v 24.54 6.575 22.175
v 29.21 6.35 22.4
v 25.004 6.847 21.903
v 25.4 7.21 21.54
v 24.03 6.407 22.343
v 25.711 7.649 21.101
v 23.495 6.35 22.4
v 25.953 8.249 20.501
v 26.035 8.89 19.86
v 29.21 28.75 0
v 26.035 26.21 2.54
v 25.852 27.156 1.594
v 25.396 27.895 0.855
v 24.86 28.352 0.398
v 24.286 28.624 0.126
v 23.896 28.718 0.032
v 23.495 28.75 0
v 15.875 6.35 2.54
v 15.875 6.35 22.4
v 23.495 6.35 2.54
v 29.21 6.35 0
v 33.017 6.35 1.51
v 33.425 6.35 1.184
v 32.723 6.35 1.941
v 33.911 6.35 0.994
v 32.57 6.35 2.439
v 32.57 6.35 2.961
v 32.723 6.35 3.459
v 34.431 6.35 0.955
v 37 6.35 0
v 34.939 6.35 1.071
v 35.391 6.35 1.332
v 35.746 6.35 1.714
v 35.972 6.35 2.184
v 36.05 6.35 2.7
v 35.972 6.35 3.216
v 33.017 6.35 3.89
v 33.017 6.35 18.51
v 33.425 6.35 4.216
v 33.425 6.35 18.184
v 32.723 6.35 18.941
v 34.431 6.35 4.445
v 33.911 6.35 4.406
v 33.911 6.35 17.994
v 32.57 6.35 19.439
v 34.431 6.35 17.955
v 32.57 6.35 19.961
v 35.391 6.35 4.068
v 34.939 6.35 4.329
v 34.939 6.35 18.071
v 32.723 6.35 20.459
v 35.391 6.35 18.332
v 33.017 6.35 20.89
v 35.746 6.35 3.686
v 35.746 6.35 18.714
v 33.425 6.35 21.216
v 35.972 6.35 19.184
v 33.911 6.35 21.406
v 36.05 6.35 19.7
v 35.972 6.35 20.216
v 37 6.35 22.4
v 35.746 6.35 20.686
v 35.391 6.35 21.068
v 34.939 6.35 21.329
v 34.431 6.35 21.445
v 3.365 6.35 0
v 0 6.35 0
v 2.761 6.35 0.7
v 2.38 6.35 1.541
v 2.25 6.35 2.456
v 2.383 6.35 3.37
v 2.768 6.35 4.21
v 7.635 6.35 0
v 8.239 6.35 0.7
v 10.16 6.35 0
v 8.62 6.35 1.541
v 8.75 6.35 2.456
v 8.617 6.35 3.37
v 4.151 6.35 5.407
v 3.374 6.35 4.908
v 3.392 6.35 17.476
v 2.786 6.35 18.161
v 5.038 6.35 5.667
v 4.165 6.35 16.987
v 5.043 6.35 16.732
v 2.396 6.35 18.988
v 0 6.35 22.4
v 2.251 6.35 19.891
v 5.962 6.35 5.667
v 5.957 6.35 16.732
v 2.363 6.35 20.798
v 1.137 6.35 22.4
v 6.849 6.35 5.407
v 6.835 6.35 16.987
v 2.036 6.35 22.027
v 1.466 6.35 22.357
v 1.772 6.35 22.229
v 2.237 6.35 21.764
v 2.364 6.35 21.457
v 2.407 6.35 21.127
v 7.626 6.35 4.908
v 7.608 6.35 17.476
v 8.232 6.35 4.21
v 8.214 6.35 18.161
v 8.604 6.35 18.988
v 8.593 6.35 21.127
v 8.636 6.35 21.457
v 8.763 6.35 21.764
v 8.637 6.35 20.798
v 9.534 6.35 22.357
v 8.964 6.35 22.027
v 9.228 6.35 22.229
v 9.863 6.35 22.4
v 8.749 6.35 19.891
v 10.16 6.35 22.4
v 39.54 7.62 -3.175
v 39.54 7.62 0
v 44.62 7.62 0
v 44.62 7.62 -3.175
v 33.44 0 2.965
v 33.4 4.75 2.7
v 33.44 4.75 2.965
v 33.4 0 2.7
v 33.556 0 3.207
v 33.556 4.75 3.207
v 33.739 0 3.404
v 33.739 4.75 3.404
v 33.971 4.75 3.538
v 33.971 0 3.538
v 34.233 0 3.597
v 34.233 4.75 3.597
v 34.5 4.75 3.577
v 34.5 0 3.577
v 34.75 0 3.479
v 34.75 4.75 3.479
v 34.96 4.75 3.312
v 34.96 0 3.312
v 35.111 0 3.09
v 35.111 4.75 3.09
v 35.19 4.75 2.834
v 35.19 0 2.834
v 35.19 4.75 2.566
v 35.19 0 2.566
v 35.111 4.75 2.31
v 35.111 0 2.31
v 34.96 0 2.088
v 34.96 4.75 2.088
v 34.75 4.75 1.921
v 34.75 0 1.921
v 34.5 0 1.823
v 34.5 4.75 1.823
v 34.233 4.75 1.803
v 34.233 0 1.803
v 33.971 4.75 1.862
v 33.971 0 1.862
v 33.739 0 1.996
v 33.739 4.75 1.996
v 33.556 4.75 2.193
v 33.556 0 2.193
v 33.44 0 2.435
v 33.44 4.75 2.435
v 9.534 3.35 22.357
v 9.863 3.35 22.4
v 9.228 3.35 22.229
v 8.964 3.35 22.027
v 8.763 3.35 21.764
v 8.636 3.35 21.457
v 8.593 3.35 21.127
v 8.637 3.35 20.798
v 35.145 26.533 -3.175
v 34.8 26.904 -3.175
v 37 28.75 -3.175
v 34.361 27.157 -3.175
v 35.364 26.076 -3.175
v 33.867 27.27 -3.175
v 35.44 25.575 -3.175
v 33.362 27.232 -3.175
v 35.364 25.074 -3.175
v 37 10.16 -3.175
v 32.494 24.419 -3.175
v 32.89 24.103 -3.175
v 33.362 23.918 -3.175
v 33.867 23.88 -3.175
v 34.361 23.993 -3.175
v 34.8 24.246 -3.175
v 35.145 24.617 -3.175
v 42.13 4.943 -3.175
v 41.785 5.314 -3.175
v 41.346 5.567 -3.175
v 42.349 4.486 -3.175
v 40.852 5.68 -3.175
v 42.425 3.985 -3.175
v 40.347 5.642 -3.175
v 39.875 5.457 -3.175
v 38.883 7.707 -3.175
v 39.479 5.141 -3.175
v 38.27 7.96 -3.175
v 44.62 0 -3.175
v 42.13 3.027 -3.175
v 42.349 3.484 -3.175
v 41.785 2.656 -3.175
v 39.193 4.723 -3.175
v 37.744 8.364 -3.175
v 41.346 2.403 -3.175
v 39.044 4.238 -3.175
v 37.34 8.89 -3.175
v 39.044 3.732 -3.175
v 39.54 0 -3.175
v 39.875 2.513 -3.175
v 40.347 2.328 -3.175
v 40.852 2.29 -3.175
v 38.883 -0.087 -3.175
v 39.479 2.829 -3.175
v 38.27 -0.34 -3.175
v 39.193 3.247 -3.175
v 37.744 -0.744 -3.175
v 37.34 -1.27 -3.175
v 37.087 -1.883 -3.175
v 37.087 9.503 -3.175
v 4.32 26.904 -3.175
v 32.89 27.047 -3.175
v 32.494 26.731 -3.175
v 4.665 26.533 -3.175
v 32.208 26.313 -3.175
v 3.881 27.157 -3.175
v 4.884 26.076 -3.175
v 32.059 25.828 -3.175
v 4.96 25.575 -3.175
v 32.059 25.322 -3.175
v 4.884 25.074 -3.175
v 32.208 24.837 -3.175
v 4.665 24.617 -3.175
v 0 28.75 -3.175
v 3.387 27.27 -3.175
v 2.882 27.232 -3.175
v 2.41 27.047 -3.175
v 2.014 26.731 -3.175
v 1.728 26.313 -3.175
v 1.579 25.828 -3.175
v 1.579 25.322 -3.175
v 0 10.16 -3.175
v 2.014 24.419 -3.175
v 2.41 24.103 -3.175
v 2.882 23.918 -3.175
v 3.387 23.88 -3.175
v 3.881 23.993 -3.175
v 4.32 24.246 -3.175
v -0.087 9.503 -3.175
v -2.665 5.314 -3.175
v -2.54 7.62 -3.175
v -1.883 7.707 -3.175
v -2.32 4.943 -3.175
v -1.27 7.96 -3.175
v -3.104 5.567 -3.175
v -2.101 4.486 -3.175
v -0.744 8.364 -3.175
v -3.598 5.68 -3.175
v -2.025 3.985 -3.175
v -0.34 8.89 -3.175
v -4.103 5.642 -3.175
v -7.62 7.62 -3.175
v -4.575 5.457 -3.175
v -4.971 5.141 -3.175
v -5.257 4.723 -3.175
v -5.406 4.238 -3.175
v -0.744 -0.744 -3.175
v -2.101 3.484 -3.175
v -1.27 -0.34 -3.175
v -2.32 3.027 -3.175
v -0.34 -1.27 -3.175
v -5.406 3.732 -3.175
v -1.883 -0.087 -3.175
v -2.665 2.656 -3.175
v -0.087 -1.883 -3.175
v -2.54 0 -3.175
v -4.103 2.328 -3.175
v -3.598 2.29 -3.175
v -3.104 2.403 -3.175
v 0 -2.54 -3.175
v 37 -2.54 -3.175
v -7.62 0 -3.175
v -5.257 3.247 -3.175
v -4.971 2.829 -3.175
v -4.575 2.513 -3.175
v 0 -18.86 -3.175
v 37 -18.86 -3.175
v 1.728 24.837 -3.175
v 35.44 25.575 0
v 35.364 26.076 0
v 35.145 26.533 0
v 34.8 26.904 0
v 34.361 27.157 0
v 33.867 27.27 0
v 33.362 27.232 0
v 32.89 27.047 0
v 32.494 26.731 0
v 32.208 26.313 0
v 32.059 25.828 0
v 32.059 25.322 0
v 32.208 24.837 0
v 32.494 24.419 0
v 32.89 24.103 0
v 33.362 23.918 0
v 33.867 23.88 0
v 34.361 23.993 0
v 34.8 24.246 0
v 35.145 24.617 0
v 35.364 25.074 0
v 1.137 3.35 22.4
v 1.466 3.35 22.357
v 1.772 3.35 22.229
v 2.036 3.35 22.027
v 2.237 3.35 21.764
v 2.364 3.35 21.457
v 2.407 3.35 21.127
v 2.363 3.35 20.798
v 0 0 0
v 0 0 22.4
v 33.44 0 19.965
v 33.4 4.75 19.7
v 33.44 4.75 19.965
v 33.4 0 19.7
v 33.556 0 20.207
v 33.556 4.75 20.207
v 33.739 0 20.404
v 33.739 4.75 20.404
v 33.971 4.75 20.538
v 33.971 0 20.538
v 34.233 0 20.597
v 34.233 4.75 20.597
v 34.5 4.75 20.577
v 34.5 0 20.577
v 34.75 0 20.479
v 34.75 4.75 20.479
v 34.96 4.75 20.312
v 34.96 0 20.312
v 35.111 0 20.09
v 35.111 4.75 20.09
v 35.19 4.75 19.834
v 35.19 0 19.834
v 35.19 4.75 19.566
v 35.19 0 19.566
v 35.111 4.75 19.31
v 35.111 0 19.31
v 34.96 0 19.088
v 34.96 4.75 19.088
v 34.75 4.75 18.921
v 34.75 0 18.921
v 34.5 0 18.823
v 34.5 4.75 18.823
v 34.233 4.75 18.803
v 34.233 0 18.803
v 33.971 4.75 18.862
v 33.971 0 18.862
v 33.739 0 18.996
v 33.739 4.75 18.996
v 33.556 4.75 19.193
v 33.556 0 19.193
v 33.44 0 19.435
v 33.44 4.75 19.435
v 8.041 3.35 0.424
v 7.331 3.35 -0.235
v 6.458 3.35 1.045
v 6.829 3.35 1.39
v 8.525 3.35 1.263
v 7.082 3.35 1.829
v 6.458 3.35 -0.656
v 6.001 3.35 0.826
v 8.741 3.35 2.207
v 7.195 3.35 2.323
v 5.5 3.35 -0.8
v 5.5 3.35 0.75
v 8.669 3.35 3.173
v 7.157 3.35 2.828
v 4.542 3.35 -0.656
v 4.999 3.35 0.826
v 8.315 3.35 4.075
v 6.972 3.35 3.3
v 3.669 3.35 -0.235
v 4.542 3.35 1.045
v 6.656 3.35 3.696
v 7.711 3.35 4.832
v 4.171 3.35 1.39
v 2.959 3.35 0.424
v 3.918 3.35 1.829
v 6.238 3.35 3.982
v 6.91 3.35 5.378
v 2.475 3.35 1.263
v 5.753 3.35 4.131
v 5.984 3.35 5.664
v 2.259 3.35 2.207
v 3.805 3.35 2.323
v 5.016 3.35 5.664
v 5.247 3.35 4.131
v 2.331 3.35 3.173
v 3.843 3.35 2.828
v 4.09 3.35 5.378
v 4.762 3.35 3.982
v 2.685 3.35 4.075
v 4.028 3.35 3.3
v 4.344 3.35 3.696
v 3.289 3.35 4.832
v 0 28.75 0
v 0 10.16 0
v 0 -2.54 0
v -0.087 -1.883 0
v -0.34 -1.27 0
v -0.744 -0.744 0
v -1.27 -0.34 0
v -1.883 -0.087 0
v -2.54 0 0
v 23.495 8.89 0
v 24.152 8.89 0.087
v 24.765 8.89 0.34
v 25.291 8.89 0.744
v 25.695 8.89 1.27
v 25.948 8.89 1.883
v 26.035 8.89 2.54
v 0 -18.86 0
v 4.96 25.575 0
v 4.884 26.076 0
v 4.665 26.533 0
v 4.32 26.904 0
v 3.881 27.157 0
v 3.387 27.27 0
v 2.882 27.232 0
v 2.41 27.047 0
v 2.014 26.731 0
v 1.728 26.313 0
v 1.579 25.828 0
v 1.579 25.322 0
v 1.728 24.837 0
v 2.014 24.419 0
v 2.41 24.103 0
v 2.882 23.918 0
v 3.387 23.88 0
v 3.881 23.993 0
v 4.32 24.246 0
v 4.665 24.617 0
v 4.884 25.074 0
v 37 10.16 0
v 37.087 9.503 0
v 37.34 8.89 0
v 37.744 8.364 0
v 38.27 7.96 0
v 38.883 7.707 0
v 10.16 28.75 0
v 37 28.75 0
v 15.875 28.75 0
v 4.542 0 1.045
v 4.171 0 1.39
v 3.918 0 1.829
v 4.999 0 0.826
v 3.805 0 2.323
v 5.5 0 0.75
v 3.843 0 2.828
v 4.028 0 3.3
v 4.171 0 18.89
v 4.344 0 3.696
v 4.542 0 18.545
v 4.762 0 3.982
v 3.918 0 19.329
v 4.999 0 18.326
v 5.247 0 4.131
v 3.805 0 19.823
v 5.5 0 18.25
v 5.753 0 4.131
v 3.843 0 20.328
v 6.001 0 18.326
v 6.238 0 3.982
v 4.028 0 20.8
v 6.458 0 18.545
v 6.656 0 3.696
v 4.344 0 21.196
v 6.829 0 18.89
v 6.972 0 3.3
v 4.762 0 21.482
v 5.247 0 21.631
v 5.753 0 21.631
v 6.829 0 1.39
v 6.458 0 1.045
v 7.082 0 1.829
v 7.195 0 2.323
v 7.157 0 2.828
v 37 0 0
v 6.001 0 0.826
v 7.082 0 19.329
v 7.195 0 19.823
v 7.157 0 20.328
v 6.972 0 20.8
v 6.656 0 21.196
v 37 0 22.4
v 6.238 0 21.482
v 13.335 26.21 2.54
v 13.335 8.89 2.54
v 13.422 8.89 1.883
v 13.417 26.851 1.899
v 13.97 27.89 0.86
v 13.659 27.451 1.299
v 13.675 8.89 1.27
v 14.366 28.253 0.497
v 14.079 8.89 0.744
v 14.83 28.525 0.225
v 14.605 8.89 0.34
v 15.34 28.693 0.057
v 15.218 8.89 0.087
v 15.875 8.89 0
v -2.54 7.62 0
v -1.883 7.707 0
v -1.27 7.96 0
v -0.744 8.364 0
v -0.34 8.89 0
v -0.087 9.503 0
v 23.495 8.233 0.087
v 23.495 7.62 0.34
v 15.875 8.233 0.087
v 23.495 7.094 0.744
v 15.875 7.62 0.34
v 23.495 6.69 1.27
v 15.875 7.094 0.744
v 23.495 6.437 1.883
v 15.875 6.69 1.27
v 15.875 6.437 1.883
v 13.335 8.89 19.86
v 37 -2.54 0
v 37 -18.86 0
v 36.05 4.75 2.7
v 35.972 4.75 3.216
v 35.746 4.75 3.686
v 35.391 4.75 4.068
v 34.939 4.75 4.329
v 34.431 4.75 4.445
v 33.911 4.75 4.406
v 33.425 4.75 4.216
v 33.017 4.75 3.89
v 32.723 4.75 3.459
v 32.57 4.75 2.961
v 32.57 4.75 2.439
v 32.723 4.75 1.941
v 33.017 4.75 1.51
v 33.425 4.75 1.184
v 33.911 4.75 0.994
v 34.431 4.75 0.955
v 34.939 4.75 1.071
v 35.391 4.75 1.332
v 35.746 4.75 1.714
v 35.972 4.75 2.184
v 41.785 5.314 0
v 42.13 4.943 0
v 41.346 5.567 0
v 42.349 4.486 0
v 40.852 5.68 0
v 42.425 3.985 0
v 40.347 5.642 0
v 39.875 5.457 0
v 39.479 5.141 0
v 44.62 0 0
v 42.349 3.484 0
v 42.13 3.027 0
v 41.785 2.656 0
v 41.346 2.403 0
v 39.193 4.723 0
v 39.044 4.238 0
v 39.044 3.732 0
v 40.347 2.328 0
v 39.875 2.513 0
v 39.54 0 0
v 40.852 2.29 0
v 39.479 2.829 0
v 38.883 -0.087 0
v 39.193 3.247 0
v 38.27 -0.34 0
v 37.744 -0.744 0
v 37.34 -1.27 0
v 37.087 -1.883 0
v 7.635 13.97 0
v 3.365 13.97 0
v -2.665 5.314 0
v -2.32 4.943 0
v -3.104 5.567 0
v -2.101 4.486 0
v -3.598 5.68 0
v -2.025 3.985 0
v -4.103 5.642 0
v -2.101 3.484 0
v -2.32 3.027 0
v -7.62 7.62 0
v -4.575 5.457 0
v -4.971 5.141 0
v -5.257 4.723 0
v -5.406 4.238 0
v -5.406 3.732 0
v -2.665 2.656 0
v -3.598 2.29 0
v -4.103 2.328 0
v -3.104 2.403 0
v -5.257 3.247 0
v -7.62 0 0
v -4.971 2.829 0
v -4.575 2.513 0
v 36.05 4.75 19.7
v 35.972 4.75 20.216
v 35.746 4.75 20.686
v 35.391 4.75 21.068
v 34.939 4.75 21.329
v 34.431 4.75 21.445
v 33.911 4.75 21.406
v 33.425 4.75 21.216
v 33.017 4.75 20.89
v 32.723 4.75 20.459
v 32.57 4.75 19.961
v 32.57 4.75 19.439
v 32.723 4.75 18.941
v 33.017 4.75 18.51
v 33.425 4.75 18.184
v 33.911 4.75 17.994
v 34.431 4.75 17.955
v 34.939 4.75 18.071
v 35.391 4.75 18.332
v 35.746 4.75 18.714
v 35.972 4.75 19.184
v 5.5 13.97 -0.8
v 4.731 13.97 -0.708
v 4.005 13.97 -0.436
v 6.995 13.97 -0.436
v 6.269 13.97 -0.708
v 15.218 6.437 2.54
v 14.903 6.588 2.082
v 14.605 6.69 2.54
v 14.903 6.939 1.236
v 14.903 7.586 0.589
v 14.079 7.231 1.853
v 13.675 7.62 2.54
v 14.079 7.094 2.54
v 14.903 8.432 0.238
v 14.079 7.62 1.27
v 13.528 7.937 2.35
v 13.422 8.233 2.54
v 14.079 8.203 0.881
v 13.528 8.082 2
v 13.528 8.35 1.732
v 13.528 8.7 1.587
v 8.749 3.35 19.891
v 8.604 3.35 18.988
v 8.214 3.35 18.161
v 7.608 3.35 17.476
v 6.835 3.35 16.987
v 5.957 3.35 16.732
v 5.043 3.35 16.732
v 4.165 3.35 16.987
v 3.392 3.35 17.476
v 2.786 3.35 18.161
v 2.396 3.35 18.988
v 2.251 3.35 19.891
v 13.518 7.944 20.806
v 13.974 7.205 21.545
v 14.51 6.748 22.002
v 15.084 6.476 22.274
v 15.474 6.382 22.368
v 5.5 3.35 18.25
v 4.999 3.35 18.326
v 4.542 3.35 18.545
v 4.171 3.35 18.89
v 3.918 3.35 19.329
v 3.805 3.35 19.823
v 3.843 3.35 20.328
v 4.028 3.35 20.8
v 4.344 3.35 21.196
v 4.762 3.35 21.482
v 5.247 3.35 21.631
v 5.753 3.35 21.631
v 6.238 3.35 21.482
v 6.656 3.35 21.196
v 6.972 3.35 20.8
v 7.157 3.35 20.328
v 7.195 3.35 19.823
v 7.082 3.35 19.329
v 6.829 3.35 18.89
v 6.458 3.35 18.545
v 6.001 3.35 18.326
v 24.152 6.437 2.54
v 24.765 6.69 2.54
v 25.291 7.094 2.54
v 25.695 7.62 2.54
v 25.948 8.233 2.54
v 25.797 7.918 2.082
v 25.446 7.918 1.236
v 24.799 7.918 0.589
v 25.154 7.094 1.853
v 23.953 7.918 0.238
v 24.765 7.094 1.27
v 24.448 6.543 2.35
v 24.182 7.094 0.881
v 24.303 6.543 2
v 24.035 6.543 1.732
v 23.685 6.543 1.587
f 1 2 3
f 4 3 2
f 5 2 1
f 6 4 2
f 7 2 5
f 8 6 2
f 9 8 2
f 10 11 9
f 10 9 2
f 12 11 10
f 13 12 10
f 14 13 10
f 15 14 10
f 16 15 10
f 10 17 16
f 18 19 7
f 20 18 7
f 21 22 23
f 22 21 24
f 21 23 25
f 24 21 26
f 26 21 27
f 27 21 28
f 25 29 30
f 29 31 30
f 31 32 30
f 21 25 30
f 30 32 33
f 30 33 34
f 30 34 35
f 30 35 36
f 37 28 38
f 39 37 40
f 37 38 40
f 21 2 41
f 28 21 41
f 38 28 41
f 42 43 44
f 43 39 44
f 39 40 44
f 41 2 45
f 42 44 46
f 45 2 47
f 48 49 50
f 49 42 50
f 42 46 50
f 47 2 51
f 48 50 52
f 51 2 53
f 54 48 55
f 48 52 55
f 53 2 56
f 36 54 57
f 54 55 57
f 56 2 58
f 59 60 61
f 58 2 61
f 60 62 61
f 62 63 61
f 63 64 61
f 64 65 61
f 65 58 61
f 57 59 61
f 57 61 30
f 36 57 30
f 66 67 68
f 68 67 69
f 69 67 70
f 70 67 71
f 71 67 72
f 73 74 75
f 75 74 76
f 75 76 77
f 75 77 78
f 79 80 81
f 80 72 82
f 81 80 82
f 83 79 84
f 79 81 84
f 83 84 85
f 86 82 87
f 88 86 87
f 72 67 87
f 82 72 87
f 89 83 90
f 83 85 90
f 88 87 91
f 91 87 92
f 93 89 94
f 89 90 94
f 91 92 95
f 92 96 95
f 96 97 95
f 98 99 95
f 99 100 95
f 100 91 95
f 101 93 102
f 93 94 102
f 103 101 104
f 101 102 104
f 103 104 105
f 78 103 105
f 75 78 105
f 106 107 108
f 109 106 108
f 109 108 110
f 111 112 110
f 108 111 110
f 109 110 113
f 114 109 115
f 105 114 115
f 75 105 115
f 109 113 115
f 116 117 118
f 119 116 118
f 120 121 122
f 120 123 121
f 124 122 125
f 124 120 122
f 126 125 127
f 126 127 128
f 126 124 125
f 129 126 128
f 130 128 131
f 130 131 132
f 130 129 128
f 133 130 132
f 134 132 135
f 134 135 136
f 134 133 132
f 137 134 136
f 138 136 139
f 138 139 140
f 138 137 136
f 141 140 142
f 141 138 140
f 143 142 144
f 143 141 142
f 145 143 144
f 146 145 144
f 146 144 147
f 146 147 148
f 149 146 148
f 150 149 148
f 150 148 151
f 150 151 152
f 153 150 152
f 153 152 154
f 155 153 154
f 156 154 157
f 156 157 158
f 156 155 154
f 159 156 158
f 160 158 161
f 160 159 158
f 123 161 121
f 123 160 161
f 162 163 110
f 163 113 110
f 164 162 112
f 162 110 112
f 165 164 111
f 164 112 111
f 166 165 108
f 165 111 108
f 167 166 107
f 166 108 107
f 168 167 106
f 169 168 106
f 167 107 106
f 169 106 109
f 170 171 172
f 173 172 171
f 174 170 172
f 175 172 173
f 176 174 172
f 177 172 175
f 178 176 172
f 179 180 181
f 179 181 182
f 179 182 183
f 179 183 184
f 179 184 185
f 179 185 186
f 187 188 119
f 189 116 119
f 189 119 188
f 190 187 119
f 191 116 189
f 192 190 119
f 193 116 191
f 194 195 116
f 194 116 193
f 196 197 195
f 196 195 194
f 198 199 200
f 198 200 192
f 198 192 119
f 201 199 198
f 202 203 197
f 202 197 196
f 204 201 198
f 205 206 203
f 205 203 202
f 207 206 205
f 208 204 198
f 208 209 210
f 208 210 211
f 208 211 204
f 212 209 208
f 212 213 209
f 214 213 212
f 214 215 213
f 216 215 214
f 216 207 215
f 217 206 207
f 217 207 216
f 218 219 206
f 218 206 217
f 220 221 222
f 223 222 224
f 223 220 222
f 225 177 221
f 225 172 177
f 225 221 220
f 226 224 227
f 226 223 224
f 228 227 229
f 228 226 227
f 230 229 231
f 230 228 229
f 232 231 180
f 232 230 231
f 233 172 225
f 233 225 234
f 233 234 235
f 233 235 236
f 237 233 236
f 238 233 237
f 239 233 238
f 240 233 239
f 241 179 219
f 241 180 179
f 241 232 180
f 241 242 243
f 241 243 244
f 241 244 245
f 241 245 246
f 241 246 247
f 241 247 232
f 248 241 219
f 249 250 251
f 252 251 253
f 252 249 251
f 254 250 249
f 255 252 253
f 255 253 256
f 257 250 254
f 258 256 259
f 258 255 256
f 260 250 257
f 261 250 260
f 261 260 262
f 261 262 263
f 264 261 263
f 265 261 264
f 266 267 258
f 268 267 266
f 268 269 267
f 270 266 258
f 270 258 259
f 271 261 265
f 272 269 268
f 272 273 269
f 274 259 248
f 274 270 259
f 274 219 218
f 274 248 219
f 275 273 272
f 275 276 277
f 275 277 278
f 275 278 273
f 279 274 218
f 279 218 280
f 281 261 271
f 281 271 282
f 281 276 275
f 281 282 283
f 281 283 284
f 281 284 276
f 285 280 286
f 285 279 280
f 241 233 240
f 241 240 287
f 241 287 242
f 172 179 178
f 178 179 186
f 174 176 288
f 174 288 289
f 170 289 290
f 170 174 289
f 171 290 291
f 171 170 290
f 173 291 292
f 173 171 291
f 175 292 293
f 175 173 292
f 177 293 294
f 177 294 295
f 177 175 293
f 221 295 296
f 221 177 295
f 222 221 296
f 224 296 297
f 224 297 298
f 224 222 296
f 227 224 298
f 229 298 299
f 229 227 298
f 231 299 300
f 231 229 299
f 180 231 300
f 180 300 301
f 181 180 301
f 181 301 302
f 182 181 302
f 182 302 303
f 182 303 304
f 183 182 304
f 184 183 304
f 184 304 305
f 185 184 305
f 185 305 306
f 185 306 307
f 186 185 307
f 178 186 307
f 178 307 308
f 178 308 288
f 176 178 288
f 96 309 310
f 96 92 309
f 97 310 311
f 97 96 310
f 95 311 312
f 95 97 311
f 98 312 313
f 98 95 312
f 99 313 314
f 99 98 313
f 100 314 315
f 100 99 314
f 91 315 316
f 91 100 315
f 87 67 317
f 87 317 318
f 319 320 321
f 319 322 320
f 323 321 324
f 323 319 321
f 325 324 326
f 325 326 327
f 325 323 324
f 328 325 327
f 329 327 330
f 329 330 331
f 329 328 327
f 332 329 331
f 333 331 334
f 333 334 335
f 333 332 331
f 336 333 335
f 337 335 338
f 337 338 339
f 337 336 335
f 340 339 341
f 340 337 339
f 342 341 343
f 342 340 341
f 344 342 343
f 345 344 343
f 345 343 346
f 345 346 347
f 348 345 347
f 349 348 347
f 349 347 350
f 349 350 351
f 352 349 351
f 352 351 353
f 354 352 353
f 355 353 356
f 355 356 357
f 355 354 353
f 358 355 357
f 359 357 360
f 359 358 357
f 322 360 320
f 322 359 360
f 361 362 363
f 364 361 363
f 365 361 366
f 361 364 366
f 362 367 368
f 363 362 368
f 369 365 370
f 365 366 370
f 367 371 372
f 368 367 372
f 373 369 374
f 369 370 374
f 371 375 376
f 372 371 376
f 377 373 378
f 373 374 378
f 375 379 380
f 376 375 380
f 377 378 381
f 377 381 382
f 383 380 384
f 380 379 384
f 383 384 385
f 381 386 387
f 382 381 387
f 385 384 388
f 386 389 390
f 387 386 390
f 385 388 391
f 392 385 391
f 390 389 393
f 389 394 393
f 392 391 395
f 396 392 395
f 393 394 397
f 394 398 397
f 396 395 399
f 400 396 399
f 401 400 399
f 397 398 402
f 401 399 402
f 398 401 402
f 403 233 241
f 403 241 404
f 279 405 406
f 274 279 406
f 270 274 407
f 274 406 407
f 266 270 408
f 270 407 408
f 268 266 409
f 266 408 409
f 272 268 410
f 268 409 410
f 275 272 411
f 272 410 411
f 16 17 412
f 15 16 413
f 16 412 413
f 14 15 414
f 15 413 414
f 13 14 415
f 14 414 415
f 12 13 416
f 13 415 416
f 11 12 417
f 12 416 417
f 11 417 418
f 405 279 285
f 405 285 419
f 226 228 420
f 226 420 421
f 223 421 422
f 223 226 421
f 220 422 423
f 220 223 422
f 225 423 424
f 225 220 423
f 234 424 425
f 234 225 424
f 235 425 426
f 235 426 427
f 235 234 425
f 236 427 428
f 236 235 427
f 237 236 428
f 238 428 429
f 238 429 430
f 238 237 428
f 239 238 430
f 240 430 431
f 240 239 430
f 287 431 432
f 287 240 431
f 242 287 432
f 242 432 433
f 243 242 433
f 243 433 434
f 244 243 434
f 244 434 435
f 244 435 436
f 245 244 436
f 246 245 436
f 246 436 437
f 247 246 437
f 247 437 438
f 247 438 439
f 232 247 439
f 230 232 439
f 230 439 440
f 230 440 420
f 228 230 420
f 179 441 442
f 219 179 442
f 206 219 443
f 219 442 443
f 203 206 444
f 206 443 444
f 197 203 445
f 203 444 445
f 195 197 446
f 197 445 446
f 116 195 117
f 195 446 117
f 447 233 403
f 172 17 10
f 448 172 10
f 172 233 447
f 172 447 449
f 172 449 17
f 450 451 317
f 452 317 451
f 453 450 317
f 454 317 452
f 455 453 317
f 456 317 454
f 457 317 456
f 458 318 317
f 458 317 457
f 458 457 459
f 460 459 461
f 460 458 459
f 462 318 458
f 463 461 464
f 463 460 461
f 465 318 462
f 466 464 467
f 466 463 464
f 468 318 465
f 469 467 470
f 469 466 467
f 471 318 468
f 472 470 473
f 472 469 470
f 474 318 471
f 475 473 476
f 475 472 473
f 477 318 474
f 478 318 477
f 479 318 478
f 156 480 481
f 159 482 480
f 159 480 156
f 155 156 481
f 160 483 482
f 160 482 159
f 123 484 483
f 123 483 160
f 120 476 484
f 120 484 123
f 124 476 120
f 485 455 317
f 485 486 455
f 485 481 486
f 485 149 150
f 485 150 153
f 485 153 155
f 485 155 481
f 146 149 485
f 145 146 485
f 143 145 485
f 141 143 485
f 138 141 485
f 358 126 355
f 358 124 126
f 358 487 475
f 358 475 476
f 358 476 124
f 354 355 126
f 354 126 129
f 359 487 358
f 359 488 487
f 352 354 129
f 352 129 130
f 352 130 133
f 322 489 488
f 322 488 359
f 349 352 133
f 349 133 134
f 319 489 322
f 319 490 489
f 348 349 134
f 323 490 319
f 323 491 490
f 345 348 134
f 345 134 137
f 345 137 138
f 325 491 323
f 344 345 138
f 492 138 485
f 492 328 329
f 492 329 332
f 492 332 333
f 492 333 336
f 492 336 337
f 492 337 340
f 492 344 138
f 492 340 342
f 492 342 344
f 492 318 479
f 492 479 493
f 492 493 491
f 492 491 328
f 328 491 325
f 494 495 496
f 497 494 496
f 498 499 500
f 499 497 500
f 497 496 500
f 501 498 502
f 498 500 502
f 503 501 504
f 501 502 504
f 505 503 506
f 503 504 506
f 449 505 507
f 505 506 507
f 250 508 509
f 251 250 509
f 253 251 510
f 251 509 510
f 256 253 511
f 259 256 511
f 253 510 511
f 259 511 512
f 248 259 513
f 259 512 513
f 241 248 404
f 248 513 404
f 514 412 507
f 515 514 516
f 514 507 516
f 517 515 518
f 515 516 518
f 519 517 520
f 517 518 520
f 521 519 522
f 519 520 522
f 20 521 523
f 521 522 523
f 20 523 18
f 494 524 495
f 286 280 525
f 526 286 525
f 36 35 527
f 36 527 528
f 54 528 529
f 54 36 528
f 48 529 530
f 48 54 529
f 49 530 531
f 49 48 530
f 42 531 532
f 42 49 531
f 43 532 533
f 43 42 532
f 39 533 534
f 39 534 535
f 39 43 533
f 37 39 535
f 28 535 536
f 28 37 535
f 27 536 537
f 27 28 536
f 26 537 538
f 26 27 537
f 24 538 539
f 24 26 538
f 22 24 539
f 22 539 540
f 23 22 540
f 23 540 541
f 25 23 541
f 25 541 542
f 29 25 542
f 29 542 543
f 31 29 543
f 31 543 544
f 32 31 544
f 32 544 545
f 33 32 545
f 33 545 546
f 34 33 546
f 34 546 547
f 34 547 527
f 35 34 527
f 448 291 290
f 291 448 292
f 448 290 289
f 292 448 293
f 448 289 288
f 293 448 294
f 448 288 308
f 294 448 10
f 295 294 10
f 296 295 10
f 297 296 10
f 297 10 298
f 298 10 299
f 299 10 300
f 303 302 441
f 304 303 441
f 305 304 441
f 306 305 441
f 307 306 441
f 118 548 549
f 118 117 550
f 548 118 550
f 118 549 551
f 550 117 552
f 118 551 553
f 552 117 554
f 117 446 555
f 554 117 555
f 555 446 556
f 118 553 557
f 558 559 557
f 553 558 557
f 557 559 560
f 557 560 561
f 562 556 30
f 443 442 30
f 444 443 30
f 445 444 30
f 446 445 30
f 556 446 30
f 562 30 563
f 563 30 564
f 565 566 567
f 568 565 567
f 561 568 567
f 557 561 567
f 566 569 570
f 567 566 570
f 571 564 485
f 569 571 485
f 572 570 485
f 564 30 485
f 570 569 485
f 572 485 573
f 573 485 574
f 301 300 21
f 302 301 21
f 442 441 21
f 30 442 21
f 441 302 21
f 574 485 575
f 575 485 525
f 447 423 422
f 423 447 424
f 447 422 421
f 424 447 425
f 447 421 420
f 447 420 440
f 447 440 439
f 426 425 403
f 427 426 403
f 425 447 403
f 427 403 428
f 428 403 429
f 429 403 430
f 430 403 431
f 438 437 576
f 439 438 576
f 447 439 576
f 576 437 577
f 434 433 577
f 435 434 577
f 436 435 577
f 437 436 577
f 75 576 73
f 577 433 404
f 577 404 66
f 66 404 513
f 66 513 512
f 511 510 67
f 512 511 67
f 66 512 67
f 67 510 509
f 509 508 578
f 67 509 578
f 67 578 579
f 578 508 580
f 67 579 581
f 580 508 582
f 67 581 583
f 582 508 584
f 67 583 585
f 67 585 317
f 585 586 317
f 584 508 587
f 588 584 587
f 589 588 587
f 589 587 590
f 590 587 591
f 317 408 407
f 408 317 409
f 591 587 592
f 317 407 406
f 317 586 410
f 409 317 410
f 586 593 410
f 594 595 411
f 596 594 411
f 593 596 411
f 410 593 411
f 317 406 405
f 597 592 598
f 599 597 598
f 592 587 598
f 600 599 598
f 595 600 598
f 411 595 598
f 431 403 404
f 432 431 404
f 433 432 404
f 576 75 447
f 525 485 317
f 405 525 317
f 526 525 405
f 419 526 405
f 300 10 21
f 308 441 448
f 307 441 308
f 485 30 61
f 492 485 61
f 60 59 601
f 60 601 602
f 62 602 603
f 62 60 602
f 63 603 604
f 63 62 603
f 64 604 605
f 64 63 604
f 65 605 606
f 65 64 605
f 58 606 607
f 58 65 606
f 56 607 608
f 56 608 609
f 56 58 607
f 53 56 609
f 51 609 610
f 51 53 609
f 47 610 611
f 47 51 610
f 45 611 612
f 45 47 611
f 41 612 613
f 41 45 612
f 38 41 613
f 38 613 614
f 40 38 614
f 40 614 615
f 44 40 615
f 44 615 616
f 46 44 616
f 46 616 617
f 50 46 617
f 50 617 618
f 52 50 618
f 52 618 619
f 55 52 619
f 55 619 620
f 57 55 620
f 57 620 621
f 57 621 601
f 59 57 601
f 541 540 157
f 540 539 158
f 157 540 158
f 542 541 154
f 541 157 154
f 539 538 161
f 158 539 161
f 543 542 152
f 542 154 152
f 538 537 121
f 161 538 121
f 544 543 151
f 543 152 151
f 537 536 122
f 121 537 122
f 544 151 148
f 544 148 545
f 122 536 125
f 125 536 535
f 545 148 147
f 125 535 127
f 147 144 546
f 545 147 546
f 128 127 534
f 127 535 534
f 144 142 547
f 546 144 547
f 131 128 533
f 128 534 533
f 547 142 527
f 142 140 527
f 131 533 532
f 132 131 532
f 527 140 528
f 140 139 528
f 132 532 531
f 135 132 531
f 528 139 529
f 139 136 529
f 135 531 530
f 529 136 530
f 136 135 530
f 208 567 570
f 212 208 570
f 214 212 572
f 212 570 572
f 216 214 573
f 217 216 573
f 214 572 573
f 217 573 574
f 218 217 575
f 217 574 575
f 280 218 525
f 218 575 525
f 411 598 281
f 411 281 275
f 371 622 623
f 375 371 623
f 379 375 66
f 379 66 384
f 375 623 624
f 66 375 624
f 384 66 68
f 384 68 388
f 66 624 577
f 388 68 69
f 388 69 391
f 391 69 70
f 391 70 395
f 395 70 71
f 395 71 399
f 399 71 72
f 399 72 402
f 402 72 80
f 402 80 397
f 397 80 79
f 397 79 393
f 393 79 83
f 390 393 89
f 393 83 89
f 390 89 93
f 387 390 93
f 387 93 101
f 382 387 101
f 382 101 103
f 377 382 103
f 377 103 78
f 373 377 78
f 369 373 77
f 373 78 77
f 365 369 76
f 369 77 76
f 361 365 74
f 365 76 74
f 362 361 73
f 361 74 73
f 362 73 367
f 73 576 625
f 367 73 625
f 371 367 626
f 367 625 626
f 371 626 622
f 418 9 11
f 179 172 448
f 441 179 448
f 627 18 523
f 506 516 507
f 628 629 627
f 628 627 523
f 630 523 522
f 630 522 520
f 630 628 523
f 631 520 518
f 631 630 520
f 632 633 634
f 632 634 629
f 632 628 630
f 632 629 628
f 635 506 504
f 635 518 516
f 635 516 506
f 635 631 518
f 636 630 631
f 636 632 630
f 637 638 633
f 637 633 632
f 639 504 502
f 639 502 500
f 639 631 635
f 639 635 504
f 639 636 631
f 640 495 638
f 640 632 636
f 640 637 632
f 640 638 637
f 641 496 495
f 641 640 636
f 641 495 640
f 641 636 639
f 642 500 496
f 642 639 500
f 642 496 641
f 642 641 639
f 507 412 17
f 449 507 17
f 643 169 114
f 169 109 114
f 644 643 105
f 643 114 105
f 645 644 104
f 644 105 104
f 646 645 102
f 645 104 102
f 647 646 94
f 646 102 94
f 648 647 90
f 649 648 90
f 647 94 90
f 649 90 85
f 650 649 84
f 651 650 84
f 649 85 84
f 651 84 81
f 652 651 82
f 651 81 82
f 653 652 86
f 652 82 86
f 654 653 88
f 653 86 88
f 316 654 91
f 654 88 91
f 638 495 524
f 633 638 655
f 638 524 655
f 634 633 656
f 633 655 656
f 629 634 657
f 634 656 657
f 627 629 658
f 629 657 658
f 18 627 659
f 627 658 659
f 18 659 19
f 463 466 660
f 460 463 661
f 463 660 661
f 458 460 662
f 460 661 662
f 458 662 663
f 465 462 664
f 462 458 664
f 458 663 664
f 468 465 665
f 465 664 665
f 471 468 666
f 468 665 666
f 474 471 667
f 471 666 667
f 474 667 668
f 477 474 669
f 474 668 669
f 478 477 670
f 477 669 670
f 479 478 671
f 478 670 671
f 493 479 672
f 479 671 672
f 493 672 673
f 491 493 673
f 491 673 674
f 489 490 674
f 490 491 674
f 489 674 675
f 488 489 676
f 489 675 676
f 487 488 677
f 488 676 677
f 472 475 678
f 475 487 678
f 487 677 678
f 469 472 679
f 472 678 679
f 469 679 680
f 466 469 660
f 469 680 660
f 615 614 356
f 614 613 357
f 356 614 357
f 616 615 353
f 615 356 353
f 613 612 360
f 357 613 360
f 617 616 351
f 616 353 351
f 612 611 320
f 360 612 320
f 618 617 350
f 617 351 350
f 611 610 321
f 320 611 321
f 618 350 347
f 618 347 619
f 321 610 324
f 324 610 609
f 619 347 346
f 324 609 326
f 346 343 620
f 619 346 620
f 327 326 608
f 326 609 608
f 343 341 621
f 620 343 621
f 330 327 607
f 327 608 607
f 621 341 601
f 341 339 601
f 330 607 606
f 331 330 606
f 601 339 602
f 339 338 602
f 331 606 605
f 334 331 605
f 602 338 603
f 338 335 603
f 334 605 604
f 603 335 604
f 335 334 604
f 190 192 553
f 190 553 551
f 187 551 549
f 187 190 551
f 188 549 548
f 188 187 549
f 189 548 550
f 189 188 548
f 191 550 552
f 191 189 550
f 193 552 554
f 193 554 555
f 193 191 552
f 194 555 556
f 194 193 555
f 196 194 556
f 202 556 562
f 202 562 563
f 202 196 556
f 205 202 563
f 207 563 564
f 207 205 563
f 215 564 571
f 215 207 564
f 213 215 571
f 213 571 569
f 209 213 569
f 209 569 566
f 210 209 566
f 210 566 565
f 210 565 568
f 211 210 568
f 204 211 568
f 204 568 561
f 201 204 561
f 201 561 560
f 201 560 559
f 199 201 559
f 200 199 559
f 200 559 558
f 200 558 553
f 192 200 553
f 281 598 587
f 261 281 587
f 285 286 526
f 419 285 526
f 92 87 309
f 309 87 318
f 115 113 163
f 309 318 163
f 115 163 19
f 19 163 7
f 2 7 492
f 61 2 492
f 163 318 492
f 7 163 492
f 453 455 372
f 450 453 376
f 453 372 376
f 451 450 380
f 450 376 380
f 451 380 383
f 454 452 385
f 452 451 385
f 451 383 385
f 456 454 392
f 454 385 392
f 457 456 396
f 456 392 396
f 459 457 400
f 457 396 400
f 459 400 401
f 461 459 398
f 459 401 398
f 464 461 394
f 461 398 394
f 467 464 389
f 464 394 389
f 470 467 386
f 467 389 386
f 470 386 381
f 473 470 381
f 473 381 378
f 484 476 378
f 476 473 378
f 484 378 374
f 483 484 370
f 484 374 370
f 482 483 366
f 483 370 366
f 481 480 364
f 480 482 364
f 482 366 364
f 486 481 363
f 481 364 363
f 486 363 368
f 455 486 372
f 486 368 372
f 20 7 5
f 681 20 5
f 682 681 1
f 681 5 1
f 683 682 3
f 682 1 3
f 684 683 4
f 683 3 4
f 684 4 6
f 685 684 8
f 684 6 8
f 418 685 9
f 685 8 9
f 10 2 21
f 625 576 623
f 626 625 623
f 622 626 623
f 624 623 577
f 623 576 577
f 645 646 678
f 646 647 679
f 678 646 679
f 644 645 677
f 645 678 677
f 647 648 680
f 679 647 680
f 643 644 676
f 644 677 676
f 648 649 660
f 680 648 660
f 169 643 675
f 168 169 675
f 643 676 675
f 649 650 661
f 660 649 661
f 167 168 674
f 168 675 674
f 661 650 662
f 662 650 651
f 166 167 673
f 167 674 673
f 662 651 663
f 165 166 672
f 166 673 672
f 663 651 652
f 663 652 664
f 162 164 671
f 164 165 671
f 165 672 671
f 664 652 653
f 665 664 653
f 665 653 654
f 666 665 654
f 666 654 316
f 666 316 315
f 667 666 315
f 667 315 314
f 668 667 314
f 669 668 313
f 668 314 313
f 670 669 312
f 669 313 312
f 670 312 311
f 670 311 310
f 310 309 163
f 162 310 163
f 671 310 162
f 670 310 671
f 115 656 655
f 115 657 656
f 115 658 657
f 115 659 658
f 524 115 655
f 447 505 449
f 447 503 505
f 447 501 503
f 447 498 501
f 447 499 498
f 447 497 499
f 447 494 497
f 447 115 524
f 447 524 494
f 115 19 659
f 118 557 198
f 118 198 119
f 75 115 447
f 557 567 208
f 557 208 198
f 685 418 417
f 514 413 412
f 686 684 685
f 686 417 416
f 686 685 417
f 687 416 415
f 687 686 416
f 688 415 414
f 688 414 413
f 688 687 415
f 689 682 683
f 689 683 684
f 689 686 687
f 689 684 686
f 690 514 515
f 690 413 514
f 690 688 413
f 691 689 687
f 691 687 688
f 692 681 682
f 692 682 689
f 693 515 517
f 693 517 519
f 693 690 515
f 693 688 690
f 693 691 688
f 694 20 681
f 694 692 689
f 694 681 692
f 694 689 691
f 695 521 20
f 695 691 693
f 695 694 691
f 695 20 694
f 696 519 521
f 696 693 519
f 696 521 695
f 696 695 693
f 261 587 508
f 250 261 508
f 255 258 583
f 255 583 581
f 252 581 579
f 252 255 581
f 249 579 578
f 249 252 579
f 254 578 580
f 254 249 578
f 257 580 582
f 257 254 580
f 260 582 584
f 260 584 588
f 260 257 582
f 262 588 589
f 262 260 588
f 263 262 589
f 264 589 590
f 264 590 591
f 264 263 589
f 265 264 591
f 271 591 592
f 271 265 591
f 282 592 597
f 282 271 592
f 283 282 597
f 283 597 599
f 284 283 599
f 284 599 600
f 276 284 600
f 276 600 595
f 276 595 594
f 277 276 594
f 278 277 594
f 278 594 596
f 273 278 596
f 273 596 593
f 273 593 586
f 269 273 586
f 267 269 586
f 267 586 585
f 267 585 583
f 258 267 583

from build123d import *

# Parameters (mm, degrees)
SKETCH1_W                        = 37
SKETCH1_H                        = 22.4
BOSS_EXTRUDE1_DEPTH              = 6.35
SKETCH7_W                        = 3.175
SKETCH7_H                        = 47.610000126
BOSS_EXTRUDE2_DEPTH              = 37
CBORE_FOR_M3_SHCS3_AT_2_COUNT    = 2
CBORE_FOR_M3_SHCS3_AT_2_PITCH    = 17.5
CBORE_FOR_M1_6_SHCS1_D           = 1.8
CBORE_FOR_M1_6_SHCS1_CBORE_D     = 3.5
CBORE_FOR_M1_6_SHCS1_CBORE_DEPTH = 1.6
BOSS_EXTRUDE3_START              = -10.16
BOSS_EXTRUDE3_DEPTH              = 3.175
BOSS_EXTRUDE4_START              = -29.21
BOSS_EXTRUDE4_DEPTH              = 3.175
SKETCH18_W                       = 7.62
SKETCH18_H                       = 7.62
BOSS_EXTRUDE5_DEPTH              = 3.175
M3_CLEARANCE_HOLE1_D             = 3.4
FILLET1_R                        = 2.54
FILLET2_R                        = 1.27


with BuildPart() as part:
    # Sketch1 → Boss-Extrude1 (new body)
    with BuildSketch(Plane(origin=(0, 0, 0), x_dir=(1, 0, 0), z_dir=(0, 1, 0))):
        with Locations((18.5, 11.2)):
            Rectangle(SKETCH1_W, SKETCH1_H)
    extrude(amount=BOSS_EXTRUDE1_DEPTH)

    # Sketch7 → Boss-Extrude2 (add)
    with BuildSketch(Plane(origin=(37, 0, 0), x_dir=(0, 0, -1), z_dir=(1, 0, 0))):
        with Locations((-1.5875, 4.944999937)):
            Rectangle(SKETCH7_W, SKETCH7_H)
    extrude(amount=-BOSS_EXTRUDE2_DEPTH)

    # Sketch13 → CBORE for M3 SHCS3 (revolve, cut)
    with BuildSketch(Plane(origin=(5.5, 13.97, -2.45), x_dir=(0, 0, 1), z_dir=(1, 0, 0))):
        Polygon((0, 0), (0, 32.830000126), (1.7, 32.830000126), (1.7, 10.62), (3.25, 10.62), (3.25, 0), align=None)
    cbore_for_m3_shcs3 = revolve(axis=Axis((5.5, 20.32, -2.45), (0, -1, 0)), mode=Mode.SUBTRACT)

    # CBORE for M3 SHCS3 at 2: CBORE for M3 SHCS3 ×2
    with Locations(*[(0, 0, -i * CBORE_FOR_M3_SHCS3_AT_2_PITCH) for i in range(1, CBORE_FOR_M3_SHCS3_AT_2_COUNT)]):
        add(cbore_for_m3_shcs3, mode=Mode.SUBTRACT)

    # CBORE for M1.6 SHCS1 (through all)
    with Locations(Plane(origin=(0, 6.35, 0), x_dir=(1, 0, 0), z_dir=(0, 1, 0))):
        with Locations((34.3, 19.7), (34.3, 2.7)):
            CounterBoreHole(CBORE_FOR_M1_6_SHCS1_D / 2, CBORE_FOR_M1_6_SHCS1_CBORE_D / 2, CBORE_FOR_M1_6_SHCS1_CBORE_DEPTH)

    # Sketch16 → Boss-Extrude3 (add)
    with BuildSketch(Plane.ZY.offset(BOSS_EXTRUDE3_START)):
        Polygon((-22.4, 6.35), (0, 6.35), (0, 28.75), align=None)
    extrude(amount=-BOSS_EXTRUDE3_DEPTH)

    # Sketch16<2> → Boss-Extrude4 (add)
    with BuildSketch(Plane.ZY.offset(BOSS_EXTRUDE4_START)):
        Polygon((-22.4, 6.35), (0, 6.35), (0, 28.75), align=None)
    extrude(amount=BOSS_EXTRUDE4_DEPTH)

    # Sketch18 → Boss-Extrude5 (add, through all)
    with BuildSketch(Plane.XY):
        with Locations((40.81, 3.81)):
            Rectangle(SKETCH18_W, SKETCH18_H)
        with Locations((-3.81, 3.81)):
            Rectangle(SKETCH18_W, SKETCH18_H)
    extrude(amount=BOSS_EXTRUDE5_DEPTH)

    # M3 Clearance Hole1 (through all)
    with Locations(Plane(origin=(0, 0, 0), x_dir=(-1, 0, 0), z_dir=(0, 0, -1))):
        with Locations((-40.725, 3.985), (-33.74, 25.575), (-3.26, 25.575), (3.725, 3.985)):
            Hole(M3_CLEARANCE_HOLE1_D / 2)

    # Fillet1
    # the kernel refuses this fillet: 2.54 mm, written as the material it adds along each edge
    with BuildSketch(Plane(origin=(15.875, 8.89, -2.54), x_dir=(0, -1, 0), z_dir=(-1, 0, 0))) as fillet1_piece_1_section:
        Polygon((0, 0), (FILLET1_R, 0), (FILLET1_R, FILLET1_R), (0, FILLET1_R), align=None)
    fillet1_piece_1 = extrude(amount=FILLET1_R, mode=Mode.PRIVATE)
    fillet1_piece_1 = fillet1_piece_1 - Plane(origin=(15.875, 8.89, -2.54), x_dir=(0, 0.7071067811865475, -0.7071067811865475), z_dir=(-1, 0, 0)) * Sphere(FILLET1_R, mode=Mode.PRIVATE)
    add(fillet1_piece_1)
    with BuildSketch(Plane(origin=(23.495, 8.89, -2.54), x_dir=(1, 0, 0), z_dir=(0, -1, 0))) as fillet1_piece_2_section:
        Polygon((0, 0), (FILLET1_R, 0), (FILLET1_R, FILLET1_R), (0, FILLET1_R), align=None)
    fillet1_piece_2 = extrude(amount=FILLET1_R, mode=Mode.PRIVATE)
    fillet1_piece_2 = fillet1_piece_2 - Plane(origin=(23.495, 8.89, -2.54), x_dir=(-0.7071067811865475, 0, -0.7071067811865475), z_dir=(0, -1, 0)) * Sphere(FILLET1_R, mode=Mode.PRIVATE)
    add(fillet1_piece_2)
    with BuildSketch(Plane(origin=(0, 0, 0), x_dir=(0, -1, 0), z_dir=(0, 0, 1)), Plane(origin=(37, 7.62, 0), x_dir=(0, 1, 0), z_dir=(0, 0, 1))) as fillet1_piece_3:
        with BuildLine():
            CenterArc((FILLET1_R, -FILLET1_R), FILLET1_R, 90, 90)
            Line((0, -FILLET1_R), (0, 0))
            Line((0, 0), (FILLET1_R, 0))
        make_face()
    extrude(amount=3.175)
    with BuildSketch(Plane(origin=(0, 7.62, 0), x_dir=(0, 1, 0), z_dir=(0, 0, 1)), Plane(origin=(37, 0, 0), x_dir=(0, -1, 0), z_dir=(0, 0, 1))) as fillet1_piece_4:
        with BuildLine():
            CenterArc((FILLET1_R, FILLET1_R), FILLET1_R, 180, 90)
            Line((0, FILLET1_R), (0, 0))
            Line((0, 0), (FILLET1_R, 0))
        make_face()
    extrude(amount=3.175)
    with BuildSketch(Plane(origin=(15.875, 6.35, 0), x_dir=(0, 0, -1), z_dir=(1, 0, 0))) as fillet1_piece_5:
        with BuildLine():
            CenterArc((FILLET1_R, FILLET1_R), FILLET1_R, 180, 90)
            Line((0, FILLET1_R), (0, 0))
            Line((0, 0), (FILLET1_R, 0))
        make_face()
    extrude(amount=7.62)
    with BuildSketch(Plane(origin=(13.335, 8.89, 0), x_dir=(1, 0, 0), z_dir=(0, 1, 0))) as fillet1_piece_6_section:
        with BuildLine():
            CenterArc((FILLET1_R, FILLET1_R), FILLET1_R, 180, 90)
            Line((0, FILLET1_R), (0, 0))
            Line((0, 0), (FILLET1_R, 0))
        make_face()
    fillet1_piece_6 = extrude(amount=19.86, mode=Mode.PRIVATE)
    fillet1_piece_6 = split(fillet1_piece_6, bisect_by=Plane(origin=(13.919159385, 23.364808453, -5.385191547), z_dir=(0, -0.7071067811865476, 0.7071067811865476)), keep=Keep.TOP, mode=Mode.PRIVATE)
    add(fillet1_piece_6)
    with BuildSketch(Plane(origin=(13.335, 6.35, -22.4), x_dir=(1, 0, 0), z_dir=(0, 0, 1))) as fillet1_piece_7_section:
        with BuildLine():
            CenterArc((FILLET1_R, FILLET1_R), FILLET1_R, 180, 90)
            Line((0, FILLET1_R), (0, 0))
            Line((0, 0), (FILLET1_R, 0))
        make_face()
    fillet1_piece_7 = extrude(amount=19.86, mode=Mode.PRIVATE)
    fillet1_piece_7 = split(fillet1_piece_7, bisect_by=Plane(origin=(13.919159385, 11.735191547, -17.014808453), z_dir=(0, -0.7071067811865476, 0.7071067811865476)), keep=Keep.TOP, mode=Mode.PRIVATE)
    add(fillet1_piece_7)
    with BuildSketch(Plane(origin=(26.035, 6.35, -22.4), x_dir=(-1, 0, 0), z_dir=(0, 0, 1))) as fillet1_piece_8_section:
        with BuildLine():
            CenterArc((FILLET1_R, -FILLET1_R), FILLET1_R, 90, 90)
            Line((0, -FILLET1_R), (0, 0))
            Line((0, 0), (FILLET1_R, 0))
        make_face()
    fillet1_piece_8 = extrude(amount=19.86, mode=Mode.PRIVATE)
    fillet1_piece_8 = split(fillet1_piece_8, bisect_by=Plane(origin=(25.450840615, 11.735191547, -17.014808453), z_dir=(0, -0.7071067811865476, 0.7071067811865476)), keep=Keep.TOP, mode=Mode.PRIVATE)
    add(fillet1_piece_8)
    with BuildSketch(Plane(origin=(26.035, 8.89, 0), x_dir=(-1, 0, 0), z_dir=(0, 1, 0))) as fillet1_piece_9_section:
        with BuildLine():
            CenterArc((FILLET1_R, -FILLET1_R), FILLET1_R, 90, 90)
            Line((0, -FILLET1_R), (0, 0))
            Line((0, 0), (FILLET1_R, 0))
        make_face()
    fillet1_piece_9 = extrude(amount=19.86, mode=Mode.PRIVATE)
    fillet1_piece_9 = split(fillet1_piece_9, bisect_by=Plane(origin=(25.450840615, 23.364808453, -5.385191547), z_dir=(0, -0.7071067811865476, 0.7071067811865476)), keep=Keep.TOP, mode=Mode.PRIVATE)
    add(fillet1_piece_9)

    # Fillet2
    fillet2_edges = [part.edges().sort_by_distance(p)[0] for p in [
        (7.63541565, 4.85, -22.4),
        (3.36458435, 4.85, -22.4),
    ]]
    fillet(fillet2_edges, radius=FILLET2_R)


with BuildPart() as body_2:
    # Mirror1: mirrored copy
    add(part.part.mirror(Plane.XY))


solid = body_2.part
